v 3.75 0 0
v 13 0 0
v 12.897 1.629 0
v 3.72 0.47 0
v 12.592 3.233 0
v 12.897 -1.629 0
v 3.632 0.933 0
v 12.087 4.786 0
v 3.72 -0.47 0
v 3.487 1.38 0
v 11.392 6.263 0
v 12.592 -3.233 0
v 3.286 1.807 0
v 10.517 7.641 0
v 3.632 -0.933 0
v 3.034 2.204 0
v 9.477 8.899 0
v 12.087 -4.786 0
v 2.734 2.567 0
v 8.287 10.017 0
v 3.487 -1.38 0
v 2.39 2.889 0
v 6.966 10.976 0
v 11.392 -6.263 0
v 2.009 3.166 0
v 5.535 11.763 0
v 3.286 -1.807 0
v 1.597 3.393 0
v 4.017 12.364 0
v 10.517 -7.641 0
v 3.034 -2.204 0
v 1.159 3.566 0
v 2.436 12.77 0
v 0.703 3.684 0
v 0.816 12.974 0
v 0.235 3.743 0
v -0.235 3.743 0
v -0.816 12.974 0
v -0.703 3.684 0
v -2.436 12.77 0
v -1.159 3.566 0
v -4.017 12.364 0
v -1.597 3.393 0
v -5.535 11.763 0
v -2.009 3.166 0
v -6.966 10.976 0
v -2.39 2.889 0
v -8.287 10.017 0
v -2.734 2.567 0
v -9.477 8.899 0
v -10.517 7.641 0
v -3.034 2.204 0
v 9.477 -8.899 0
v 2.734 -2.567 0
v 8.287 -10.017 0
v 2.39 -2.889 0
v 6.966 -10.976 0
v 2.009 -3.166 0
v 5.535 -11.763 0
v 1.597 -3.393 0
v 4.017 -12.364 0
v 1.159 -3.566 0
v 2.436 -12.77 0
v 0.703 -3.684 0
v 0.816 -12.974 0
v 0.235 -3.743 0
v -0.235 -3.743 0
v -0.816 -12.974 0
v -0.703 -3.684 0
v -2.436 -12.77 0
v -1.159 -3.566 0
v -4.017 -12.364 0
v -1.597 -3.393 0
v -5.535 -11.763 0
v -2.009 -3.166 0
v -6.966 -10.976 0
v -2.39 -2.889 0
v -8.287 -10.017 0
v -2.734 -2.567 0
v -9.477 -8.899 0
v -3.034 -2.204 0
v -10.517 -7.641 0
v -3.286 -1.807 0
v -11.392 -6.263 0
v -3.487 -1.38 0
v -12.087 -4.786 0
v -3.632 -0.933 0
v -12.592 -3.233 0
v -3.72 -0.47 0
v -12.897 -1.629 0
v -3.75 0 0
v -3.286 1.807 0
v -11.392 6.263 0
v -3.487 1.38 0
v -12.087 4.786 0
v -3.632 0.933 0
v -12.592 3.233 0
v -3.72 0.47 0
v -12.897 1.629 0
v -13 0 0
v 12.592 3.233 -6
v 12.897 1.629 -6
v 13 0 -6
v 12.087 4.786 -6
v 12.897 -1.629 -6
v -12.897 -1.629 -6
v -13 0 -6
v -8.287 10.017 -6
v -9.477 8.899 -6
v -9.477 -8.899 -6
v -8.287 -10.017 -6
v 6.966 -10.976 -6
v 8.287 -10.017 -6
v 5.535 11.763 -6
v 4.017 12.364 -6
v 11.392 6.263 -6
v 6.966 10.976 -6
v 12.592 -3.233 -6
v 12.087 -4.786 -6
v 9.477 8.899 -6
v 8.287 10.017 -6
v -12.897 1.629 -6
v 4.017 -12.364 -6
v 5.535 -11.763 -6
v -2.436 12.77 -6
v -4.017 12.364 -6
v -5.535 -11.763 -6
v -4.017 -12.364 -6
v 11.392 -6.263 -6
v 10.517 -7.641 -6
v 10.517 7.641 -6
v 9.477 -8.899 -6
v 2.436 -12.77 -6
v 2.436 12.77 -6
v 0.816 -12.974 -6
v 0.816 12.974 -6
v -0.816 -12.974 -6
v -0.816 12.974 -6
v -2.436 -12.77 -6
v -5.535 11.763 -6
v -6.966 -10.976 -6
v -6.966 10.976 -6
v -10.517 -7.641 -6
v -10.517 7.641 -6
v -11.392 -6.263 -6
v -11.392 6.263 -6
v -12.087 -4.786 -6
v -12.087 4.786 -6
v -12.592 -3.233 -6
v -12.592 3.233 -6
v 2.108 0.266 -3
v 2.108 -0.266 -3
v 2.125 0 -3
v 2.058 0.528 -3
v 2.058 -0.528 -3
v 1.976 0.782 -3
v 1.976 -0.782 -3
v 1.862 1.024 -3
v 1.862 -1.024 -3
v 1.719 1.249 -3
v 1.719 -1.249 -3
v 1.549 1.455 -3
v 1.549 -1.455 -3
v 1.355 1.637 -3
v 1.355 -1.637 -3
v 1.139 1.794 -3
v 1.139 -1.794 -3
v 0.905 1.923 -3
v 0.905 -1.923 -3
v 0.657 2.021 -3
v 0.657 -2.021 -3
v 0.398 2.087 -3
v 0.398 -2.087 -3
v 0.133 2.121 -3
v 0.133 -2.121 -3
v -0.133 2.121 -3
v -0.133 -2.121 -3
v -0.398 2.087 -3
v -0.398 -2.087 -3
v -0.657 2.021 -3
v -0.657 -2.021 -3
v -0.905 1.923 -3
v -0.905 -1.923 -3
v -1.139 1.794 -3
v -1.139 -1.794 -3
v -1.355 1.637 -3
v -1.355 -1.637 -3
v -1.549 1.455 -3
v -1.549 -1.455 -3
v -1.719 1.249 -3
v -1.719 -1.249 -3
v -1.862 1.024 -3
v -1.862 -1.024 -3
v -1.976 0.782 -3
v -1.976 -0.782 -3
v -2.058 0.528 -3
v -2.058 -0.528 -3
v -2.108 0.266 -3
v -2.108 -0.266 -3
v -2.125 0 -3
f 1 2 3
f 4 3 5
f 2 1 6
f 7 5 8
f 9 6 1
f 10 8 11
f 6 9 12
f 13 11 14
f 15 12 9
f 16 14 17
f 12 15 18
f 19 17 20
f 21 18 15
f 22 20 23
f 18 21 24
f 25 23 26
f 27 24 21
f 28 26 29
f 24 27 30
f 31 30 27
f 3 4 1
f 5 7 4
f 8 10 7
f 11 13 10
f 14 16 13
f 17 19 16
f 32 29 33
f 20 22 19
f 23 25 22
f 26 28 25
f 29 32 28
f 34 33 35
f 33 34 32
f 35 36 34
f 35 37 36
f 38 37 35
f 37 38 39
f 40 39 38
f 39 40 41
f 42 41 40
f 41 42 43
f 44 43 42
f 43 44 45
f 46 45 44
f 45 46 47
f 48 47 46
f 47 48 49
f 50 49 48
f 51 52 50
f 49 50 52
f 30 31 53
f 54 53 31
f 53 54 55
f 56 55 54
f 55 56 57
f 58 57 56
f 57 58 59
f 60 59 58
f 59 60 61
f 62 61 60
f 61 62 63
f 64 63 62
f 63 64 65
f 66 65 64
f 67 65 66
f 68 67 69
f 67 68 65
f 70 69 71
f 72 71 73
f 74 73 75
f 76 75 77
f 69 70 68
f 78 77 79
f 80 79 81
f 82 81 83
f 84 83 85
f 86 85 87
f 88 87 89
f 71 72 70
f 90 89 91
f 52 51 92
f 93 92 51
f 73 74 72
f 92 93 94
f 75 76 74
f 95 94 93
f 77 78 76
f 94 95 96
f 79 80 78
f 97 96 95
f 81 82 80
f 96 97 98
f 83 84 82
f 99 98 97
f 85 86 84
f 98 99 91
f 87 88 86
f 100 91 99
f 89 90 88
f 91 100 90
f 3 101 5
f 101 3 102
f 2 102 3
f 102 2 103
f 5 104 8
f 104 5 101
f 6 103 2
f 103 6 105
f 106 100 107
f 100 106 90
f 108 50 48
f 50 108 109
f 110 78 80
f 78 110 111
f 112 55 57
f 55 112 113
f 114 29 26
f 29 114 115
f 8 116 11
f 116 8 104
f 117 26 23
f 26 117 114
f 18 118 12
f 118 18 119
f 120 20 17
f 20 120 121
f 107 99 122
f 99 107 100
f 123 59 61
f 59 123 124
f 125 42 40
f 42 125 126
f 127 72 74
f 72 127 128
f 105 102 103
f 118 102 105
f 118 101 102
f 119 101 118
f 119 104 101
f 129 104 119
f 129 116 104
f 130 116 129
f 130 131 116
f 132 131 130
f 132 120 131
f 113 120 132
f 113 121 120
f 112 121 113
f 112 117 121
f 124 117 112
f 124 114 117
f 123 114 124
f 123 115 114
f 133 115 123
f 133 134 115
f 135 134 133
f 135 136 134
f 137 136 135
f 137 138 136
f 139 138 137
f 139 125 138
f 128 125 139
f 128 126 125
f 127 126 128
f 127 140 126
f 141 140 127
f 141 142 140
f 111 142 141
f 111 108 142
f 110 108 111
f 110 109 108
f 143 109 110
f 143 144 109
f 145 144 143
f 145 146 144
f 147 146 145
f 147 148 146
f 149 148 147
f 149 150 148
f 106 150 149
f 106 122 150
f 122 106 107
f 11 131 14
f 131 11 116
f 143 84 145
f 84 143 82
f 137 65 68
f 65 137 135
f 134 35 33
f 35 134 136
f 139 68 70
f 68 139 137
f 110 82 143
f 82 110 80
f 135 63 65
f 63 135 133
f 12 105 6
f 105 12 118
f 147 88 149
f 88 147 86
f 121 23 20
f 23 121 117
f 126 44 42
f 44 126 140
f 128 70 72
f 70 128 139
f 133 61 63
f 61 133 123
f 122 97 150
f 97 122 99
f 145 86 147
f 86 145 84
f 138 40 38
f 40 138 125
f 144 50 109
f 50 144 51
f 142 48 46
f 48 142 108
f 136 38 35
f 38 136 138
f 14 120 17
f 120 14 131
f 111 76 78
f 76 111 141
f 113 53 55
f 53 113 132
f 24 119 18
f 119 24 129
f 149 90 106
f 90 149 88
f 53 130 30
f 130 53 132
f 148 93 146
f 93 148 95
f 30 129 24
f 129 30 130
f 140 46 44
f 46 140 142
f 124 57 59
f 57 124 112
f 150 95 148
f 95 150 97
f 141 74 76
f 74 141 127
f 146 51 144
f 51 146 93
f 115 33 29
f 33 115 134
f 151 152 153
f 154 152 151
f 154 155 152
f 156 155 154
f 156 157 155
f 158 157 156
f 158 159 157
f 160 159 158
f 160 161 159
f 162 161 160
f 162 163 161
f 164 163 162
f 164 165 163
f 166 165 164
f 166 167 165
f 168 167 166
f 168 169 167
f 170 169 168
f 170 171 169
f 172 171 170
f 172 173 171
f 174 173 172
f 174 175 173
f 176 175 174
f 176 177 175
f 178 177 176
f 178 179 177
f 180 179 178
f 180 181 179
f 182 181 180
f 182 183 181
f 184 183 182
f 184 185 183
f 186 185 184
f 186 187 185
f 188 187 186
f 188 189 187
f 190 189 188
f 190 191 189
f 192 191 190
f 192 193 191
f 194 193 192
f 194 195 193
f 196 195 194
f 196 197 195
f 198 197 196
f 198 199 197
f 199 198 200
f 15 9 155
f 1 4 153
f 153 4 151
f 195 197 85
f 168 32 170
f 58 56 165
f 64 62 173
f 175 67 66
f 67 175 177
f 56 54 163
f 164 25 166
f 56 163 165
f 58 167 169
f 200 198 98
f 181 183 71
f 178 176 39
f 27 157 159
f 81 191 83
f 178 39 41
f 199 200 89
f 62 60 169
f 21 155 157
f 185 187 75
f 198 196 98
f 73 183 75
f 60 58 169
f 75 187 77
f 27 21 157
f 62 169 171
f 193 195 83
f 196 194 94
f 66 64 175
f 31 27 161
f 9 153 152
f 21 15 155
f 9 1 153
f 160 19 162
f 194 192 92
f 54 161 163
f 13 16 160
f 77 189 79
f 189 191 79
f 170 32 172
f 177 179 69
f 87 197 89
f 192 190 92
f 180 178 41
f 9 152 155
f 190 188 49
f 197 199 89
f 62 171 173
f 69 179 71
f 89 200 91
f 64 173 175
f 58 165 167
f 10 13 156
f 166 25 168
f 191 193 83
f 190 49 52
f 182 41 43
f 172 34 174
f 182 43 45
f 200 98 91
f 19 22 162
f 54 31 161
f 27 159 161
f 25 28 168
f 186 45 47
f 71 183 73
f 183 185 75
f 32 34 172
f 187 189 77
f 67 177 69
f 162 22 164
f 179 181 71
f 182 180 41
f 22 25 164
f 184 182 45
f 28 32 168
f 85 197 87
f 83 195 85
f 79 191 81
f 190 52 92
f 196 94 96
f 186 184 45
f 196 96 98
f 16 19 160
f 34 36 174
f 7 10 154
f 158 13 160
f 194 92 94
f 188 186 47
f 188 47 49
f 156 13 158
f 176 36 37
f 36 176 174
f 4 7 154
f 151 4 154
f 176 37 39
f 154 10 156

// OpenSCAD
$fn = 50;


difference() {
	union() {
		translate(v = [0, 0, -3.0000000000]) {
			cylinder(h = 3, r = 7.0000000000);
		}
		translate(v = [0, 0, -6.0000000000]) {
			cylinder(h = 6, r = 13.0000000000);
		}
	}
	union() {
		translate(v = [0, 0, 0]) {
			rotate(a = [0, 0, 0]) {
				difference() {
					union() {
						#translate(v = [0, 0, -3.0000000000]) {
							cylinder(h = 3, r = 2.0000000000);
						}
						#translate(v = [0, 0, -3]) {
							cylinder(h = 3, r = 7.0000000000, r1 = 2.1250000000, r2 = 3.7500000000);
						}
						#translate(v = [0, 0, -3.0000000000]) {
							cylinder(h = 3, r = 2.1250000000);
						}
						#translate(v = [0, 0, -3.0000000000]) {
							cylinder(h = 3, r = 2.0000000000);
						}
					}
					union();
				}
			}
		}
	}
}
